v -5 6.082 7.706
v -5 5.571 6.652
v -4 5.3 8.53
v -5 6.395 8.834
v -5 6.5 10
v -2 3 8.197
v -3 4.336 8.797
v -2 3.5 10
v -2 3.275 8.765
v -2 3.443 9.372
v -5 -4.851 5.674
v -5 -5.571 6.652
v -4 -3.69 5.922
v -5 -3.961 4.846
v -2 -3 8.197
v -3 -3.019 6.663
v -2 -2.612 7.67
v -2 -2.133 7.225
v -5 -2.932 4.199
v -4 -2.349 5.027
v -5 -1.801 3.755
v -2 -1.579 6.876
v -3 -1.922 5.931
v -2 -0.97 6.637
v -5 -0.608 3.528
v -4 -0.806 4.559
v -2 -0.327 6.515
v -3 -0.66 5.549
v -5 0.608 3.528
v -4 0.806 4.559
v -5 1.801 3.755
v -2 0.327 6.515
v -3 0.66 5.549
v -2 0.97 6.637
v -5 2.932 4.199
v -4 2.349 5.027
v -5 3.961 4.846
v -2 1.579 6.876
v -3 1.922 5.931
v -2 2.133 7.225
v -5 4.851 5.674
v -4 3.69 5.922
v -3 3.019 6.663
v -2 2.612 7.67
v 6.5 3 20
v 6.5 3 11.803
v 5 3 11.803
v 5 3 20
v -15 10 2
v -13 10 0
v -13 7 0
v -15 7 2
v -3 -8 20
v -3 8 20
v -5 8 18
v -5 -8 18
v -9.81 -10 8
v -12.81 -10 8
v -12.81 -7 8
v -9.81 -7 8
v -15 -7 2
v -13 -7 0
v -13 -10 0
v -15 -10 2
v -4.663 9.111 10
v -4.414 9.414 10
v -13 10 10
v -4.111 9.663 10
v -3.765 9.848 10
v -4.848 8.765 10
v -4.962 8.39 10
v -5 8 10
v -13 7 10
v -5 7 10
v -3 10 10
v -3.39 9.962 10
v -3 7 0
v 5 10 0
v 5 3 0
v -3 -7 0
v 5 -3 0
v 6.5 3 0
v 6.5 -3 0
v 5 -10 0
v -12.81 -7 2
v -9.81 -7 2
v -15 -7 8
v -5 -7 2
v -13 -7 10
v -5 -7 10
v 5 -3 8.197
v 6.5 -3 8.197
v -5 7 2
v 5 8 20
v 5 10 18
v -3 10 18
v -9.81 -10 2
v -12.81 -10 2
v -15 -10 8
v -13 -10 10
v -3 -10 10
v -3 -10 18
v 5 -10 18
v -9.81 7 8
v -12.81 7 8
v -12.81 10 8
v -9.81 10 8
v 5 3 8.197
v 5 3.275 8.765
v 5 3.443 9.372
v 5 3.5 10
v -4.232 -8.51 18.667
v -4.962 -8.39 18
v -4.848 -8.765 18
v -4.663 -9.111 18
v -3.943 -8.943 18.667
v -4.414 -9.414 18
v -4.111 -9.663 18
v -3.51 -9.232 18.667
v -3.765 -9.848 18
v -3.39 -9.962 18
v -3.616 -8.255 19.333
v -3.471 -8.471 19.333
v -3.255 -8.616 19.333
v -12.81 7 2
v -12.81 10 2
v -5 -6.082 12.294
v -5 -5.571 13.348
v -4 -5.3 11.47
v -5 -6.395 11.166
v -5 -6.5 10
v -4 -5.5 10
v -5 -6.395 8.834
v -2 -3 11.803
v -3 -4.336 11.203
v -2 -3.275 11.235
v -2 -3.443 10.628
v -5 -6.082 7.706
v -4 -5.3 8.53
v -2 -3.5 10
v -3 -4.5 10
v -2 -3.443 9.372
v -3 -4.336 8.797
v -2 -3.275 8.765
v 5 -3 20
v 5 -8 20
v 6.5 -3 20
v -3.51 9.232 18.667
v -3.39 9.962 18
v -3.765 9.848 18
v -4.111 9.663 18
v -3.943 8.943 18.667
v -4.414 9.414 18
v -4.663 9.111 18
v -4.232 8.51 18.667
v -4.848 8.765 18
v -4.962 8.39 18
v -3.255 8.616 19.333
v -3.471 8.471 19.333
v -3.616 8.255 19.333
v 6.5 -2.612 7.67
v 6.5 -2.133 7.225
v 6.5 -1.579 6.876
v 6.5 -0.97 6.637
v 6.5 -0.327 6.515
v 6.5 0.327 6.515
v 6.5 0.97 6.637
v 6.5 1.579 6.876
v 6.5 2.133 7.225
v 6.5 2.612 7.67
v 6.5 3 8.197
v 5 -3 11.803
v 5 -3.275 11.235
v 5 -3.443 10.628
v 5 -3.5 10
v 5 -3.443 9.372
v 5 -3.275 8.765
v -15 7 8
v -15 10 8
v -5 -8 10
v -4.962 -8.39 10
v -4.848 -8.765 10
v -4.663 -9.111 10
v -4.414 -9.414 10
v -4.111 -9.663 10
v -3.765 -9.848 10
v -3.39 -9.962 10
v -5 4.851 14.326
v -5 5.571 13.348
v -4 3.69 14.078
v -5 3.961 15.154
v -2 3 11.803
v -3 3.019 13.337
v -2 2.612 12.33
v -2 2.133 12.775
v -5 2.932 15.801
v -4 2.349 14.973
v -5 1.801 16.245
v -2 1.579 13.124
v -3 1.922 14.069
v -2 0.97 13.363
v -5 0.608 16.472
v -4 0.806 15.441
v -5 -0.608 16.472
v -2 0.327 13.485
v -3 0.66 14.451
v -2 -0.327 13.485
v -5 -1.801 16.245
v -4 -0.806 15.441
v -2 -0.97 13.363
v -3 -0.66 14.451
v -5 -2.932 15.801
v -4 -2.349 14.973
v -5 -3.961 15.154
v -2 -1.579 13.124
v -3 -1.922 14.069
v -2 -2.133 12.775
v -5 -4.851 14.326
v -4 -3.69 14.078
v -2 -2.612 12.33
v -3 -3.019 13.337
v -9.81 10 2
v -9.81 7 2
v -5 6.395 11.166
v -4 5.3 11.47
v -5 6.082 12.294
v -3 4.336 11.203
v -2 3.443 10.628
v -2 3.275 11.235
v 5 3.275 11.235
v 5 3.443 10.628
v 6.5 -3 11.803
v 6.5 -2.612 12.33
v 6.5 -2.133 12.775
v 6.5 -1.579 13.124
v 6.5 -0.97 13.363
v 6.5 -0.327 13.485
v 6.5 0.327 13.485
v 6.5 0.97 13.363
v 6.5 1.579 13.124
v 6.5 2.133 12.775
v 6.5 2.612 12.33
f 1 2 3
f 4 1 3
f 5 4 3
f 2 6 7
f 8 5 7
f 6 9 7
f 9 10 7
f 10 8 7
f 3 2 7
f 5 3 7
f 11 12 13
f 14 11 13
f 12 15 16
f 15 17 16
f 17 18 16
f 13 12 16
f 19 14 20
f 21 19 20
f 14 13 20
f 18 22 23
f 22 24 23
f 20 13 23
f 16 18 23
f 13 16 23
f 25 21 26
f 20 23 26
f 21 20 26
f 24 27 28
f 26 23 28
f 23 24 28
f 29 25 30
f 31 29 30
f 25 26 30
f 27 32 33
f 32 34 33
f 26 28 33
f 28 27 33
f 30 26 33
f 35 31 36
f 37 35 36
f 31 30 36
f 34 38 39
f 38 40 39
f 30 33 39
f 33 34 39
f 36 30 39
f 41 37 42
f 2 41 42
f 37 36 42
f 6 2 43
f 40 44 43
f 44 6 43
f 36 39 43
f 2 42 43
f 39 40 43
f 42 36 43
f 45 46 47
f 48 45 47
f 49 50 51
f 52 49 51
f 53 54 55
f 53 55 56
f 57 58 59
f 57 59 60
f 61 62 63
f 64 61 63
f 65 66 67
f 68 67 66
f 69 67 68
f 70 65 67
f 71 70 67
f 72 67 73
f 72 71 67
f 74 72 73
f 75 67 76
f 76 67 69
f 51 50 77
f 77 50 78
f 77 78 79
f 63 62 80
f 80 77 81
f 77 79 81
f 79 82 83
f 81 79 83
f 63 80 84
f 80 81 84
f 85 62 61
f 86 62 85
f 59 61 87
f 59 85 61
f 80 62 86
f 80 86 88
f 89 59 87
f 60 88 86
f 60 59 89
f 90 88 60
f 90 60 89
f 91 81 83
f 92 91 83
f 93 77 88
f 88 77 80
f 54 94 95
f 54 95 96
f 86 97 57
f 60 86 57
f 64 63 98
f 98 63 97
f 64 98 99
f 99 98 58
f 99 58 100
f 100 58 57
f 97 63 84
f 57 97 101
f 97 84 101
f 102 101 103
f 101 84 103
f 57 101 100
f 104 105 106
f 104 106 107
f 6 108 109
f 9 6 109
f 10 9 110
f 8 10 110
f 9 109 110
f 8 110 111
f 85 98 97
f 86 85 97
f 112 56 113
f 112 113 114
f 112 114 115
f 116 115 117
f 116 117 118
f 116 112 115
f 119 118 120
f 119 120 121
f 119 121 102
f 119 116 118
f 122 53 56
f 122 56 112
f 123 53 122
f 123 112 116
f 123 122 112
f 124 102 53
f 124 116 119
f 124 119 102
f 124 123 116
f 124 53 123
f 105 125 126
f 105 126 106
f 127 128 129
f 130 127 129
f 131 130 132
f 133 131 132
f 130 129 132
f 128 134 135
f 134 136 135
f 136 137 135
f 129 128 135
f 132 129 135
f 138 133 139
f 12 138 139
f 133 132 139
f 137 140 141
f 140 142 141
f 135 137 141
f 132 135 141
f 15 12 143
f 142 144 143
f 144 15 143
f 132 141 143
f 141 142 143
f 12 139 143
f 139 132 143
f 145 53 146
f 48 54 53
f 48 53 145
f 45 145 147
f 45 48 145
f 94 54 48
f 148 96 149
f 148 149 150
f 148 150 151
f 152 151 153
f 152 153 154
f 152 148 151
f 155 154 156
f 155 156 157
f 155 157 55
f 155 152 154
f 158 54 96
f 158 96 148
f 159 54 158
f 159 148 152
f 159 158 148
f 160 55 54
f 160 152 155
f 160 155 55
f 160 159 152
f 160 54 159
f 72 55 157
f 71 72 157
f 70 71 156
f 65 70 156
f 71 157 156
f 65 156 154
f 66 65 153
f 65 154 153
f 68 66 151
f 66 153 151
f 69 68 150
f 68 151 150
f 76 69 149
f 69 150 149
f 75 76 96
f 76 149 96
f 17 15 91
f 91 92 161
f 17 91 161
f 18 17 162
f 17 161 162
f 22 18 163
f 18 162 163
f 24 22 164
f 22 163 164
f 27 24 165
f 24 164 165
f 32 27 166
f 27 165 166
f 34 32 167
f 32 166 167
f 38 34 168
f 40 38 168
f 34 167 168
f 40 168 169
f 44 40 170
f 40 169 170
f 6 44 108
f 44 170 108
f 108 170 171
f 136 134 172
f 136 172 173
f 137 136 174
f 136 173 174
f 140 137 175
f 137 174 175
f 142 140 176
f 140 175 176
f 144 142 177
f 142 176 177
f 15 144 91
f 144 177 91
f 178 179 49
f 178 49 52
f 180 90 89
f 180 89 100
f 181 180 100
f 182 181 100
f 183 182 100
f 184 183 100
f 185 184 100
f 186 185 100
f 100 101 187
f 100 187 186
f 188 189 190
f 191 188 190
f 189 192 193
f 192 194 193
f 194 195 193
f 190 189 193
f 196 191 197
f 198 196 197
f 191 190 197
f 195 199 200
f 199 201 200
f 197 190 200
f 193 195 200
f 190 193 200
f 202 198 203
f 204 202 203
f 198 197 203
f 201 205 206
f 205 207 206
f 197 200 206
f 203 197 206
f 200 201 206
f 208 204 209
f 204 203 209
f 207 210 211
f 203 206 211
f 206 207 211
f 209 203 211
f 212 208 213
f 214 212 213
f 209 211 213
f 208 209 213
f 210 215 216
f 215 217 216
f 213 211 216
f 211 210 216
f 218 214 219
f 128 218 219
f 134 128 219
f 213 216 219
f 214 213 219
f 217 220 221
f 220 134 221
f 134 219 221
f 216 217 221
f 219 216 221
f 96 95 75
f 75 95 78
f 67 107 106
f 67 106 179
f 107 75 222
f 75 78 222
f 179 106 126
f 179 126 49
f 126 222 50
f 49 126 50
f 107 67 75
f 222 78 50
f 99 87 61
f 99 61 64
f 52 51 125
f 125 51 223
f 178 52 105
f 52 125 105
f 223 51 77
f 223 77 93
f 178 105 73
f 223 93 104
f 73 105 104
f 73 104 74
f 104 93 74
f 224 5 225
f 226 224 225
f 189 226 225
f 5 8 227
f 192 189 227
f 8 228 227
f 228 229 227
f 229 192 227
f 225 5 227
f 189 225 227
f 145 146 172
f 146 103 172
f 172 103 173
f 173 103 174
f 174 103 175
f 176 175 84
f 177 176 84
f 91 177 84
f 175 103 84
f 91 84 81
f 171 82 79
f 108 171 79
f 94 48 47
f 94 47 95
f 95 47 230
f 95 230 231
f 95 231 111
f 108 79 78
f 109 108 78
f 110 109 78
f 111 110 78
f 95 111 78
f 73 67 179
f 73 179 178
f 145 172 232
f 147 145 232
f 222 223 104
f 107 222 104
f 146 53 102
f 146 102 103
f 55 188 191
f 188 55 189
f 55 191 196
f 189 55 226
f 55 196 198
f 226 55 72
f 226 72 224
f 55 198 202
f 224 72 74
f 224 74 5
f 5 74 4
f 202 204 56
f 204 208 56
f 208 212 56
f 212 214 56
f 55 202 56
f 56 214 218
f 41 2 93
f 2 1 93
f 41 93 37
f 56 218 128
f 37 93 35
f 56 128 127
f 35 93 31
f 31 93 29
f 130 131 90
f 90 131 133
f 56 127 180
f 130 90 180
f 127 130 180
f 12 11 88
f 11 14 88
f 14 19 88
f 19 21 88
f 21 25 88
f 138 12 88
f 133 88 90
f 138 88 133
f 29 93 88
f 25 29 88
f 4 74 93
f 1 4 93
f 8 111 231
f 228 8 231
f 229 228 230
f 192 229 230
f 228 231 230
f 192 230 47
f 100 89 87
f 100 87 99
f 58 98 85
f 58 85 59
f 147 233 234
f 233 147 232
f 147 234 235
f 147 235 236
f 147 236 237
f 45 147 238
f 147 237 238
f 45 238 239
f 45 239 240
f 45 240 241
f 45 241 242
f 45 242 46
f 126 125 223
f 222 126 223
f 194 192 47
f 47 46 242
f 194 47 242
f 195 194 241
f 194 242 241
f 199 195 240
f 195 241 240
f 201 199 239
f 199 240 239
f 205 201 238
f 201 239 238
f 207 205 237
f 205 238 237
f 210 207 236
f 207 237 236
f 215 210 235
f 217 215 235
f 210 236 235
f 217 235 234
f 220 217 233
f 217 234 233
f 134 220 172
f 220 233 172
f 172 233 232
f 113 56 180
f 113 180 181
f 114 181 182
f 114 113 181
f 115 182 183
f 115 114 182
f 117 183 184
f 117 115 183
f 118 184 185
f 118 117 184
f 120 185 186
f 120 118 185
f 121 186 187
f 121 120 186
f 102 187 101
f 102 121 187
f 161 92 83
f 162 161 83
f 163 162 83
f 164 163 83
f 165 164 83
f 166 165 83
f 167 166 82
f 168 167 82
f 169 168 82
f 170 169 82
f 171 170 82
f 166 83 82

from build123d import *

# Parameters (mm, degrees)
F1_DEPTH = 20
F3_DEPTH = 15
F4_SIZE  = 3
F5_W     = 3
F5_H     = 10
F6_DEPTH = 10
F7_W     = 3
F7_H     = 6
F8_DEPTH = 25
F9_R     = 2
F10_SIZE = 2


with BuildPart() as f1:
    # F0 (on Top) → F1 (new body)
    with BuildSketch(Plane.XY):
        Polygon((5, 10), (-5, 10), (-5, -10), (5, -10), (5, -3), (6.5, -3), (6.5, 3), (5, 3), align=None)
    extrude(amount=F1_DEPTH)

    # F2 (on face) → F3 (cut)
    with BuildSketch(Plane.YZ.offset(6.5)):
        with BuildLine():
            ThreePointArc((3, 8.1972243623), (3.3726843908, 9.0645856533), (3.5, 10))
            ThreePointArc((3.5, 10), (3.3726843908, 10.9354143467), (3, 11.8027756377))
            Line((3, 11.8027756377), (3, 8.1972243623))
        make_face()
        with BuildLine():
            Line((3, 8.1972243623), (3, 11.8027756377))
            ThreePointArc((3, 11.8027756377), (0, 13.5), (-3, 11.8027756377))
            Line((-3, 11.8027756377), (-3, 8.1972243623))
            ThreePointArc((-3, 8.1972243623), (0, 6.5), (3, 8.1972243623))
        make_face()
        with BuildLine():
            Line((-3, 8.1972243623), (-3, 11.8027756377))
            ThreePointArc((-3, 11.8027756377), (-3.5, 10), (-3, 8.1972243623))
        make_face()
    extrude(amount=-F3_DEPTH, mode=Mode.SUBTRACT)

    # F4
    f4_edges = [f1.edges().sort_by_distance(p)[0] for p in [
        (-5, 3, 8.197224),
    ]]
    chamfer(f4_edges, length=F4_SIZE)

    # F5 (on face) → F6 (join)
    with BuildSketch(Plane(origin=(-5, 0, 0), x_dir=(0, -1, 0), z_dir=(-1, 0, 0))):
        with Locations((8.5, 5)):
            Rectangle(F5_W, F5_H)
        with Locations((-8.5, 5)):
            Rectangle(F5_W, F5_H)
    extrude(amount=F6_DEPTH)

    # F7 (on face) → F8 (cut)
    with BuildSketch(Plane.XZ.offset(10)):
        with Locations((-11.3098823801, 5)):
            Rectangle(F7_W, F7_H)
    extrude(amount=-F8_DEPTH, mode=Mode.SUBTRACT)

    # F9
    f9_edges = [f1.edges().sort_by_distance(p)[0] for p in [
        (-5, -10, 15),
        (-5, 10, 15),
    ]]
    fillet(f9_edges, radius=F9_R)

    # F10
    f10_edges = [f1.edges().sort_by_distance(p)[0] for p in [
        (-15, -8.5, 10),
        (-15, 8.5, 10),
        (-15, 8.5, 0),
        (-15, -8.5, 0),
        (-5, 0, 0),
        (-5, 0, 20),
    ]]
    chamfer(f10_edges, length=F10_SIZE)


solid = f1.part
